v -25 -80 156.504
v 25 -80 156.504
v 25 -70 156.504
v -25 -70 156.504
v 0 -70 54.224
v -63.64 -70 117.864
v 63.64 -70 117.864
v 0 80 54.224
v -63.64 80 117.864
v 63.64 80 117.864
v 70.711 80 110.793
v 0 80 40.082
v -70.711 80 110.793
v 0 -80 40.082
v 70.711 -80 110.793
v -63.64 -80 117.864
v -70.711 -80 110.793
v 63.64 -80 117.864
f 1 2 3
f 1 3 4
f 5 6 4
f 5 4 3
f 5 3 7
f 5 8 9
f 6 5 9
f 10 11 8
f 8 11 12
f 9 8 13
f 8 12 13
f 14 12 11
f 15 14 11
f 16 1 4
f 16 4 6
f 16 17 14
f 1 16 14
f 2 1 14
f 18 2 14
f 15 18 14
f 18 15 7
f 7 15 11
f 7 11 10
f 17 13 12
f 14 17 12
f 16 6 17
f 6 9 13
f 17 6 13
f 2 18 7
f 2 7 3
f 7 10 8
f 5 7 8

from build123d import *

# Parameters (mm, degrees)
BOSS_EXTRUDE1_DEPTH = 80
BOSS_EXTRUDE2_DEPTH = 10


with BuildPart() as part:
    # Sketch1 → Boss-Extrude1 (new, symmetric)
    with BuildSketch(Plane(origin=(0, 0, 0), x_dir=(1, 0, 0), z_dir=(0, 1, 0))):
        Polygon((0, -40.082250377), (70.710678119, -110.792928496), (63.639610307, -117.863996308), (0, -54.224386001), (-63.639610307, -117.863996308), (-70.710678119, -110.792928496), align=None)
    extrude(amount=BOSS_EXTRUDE1_DEPTH, both=True)

    # Sketch2 → Boss-Extrude2 (add)
    with BuildSketch(Plane.XZ.offset(80)):
        Polygon((-63.639610307, 117.863996308), (0, 54.224386001), (63.639610307, 117.863996308), (25, 156.503606614), (-25, 156.503606614), align=None)
    extrude(amount=-BOSS_EXTRUDE2_DEPTH)


solid = part.part
